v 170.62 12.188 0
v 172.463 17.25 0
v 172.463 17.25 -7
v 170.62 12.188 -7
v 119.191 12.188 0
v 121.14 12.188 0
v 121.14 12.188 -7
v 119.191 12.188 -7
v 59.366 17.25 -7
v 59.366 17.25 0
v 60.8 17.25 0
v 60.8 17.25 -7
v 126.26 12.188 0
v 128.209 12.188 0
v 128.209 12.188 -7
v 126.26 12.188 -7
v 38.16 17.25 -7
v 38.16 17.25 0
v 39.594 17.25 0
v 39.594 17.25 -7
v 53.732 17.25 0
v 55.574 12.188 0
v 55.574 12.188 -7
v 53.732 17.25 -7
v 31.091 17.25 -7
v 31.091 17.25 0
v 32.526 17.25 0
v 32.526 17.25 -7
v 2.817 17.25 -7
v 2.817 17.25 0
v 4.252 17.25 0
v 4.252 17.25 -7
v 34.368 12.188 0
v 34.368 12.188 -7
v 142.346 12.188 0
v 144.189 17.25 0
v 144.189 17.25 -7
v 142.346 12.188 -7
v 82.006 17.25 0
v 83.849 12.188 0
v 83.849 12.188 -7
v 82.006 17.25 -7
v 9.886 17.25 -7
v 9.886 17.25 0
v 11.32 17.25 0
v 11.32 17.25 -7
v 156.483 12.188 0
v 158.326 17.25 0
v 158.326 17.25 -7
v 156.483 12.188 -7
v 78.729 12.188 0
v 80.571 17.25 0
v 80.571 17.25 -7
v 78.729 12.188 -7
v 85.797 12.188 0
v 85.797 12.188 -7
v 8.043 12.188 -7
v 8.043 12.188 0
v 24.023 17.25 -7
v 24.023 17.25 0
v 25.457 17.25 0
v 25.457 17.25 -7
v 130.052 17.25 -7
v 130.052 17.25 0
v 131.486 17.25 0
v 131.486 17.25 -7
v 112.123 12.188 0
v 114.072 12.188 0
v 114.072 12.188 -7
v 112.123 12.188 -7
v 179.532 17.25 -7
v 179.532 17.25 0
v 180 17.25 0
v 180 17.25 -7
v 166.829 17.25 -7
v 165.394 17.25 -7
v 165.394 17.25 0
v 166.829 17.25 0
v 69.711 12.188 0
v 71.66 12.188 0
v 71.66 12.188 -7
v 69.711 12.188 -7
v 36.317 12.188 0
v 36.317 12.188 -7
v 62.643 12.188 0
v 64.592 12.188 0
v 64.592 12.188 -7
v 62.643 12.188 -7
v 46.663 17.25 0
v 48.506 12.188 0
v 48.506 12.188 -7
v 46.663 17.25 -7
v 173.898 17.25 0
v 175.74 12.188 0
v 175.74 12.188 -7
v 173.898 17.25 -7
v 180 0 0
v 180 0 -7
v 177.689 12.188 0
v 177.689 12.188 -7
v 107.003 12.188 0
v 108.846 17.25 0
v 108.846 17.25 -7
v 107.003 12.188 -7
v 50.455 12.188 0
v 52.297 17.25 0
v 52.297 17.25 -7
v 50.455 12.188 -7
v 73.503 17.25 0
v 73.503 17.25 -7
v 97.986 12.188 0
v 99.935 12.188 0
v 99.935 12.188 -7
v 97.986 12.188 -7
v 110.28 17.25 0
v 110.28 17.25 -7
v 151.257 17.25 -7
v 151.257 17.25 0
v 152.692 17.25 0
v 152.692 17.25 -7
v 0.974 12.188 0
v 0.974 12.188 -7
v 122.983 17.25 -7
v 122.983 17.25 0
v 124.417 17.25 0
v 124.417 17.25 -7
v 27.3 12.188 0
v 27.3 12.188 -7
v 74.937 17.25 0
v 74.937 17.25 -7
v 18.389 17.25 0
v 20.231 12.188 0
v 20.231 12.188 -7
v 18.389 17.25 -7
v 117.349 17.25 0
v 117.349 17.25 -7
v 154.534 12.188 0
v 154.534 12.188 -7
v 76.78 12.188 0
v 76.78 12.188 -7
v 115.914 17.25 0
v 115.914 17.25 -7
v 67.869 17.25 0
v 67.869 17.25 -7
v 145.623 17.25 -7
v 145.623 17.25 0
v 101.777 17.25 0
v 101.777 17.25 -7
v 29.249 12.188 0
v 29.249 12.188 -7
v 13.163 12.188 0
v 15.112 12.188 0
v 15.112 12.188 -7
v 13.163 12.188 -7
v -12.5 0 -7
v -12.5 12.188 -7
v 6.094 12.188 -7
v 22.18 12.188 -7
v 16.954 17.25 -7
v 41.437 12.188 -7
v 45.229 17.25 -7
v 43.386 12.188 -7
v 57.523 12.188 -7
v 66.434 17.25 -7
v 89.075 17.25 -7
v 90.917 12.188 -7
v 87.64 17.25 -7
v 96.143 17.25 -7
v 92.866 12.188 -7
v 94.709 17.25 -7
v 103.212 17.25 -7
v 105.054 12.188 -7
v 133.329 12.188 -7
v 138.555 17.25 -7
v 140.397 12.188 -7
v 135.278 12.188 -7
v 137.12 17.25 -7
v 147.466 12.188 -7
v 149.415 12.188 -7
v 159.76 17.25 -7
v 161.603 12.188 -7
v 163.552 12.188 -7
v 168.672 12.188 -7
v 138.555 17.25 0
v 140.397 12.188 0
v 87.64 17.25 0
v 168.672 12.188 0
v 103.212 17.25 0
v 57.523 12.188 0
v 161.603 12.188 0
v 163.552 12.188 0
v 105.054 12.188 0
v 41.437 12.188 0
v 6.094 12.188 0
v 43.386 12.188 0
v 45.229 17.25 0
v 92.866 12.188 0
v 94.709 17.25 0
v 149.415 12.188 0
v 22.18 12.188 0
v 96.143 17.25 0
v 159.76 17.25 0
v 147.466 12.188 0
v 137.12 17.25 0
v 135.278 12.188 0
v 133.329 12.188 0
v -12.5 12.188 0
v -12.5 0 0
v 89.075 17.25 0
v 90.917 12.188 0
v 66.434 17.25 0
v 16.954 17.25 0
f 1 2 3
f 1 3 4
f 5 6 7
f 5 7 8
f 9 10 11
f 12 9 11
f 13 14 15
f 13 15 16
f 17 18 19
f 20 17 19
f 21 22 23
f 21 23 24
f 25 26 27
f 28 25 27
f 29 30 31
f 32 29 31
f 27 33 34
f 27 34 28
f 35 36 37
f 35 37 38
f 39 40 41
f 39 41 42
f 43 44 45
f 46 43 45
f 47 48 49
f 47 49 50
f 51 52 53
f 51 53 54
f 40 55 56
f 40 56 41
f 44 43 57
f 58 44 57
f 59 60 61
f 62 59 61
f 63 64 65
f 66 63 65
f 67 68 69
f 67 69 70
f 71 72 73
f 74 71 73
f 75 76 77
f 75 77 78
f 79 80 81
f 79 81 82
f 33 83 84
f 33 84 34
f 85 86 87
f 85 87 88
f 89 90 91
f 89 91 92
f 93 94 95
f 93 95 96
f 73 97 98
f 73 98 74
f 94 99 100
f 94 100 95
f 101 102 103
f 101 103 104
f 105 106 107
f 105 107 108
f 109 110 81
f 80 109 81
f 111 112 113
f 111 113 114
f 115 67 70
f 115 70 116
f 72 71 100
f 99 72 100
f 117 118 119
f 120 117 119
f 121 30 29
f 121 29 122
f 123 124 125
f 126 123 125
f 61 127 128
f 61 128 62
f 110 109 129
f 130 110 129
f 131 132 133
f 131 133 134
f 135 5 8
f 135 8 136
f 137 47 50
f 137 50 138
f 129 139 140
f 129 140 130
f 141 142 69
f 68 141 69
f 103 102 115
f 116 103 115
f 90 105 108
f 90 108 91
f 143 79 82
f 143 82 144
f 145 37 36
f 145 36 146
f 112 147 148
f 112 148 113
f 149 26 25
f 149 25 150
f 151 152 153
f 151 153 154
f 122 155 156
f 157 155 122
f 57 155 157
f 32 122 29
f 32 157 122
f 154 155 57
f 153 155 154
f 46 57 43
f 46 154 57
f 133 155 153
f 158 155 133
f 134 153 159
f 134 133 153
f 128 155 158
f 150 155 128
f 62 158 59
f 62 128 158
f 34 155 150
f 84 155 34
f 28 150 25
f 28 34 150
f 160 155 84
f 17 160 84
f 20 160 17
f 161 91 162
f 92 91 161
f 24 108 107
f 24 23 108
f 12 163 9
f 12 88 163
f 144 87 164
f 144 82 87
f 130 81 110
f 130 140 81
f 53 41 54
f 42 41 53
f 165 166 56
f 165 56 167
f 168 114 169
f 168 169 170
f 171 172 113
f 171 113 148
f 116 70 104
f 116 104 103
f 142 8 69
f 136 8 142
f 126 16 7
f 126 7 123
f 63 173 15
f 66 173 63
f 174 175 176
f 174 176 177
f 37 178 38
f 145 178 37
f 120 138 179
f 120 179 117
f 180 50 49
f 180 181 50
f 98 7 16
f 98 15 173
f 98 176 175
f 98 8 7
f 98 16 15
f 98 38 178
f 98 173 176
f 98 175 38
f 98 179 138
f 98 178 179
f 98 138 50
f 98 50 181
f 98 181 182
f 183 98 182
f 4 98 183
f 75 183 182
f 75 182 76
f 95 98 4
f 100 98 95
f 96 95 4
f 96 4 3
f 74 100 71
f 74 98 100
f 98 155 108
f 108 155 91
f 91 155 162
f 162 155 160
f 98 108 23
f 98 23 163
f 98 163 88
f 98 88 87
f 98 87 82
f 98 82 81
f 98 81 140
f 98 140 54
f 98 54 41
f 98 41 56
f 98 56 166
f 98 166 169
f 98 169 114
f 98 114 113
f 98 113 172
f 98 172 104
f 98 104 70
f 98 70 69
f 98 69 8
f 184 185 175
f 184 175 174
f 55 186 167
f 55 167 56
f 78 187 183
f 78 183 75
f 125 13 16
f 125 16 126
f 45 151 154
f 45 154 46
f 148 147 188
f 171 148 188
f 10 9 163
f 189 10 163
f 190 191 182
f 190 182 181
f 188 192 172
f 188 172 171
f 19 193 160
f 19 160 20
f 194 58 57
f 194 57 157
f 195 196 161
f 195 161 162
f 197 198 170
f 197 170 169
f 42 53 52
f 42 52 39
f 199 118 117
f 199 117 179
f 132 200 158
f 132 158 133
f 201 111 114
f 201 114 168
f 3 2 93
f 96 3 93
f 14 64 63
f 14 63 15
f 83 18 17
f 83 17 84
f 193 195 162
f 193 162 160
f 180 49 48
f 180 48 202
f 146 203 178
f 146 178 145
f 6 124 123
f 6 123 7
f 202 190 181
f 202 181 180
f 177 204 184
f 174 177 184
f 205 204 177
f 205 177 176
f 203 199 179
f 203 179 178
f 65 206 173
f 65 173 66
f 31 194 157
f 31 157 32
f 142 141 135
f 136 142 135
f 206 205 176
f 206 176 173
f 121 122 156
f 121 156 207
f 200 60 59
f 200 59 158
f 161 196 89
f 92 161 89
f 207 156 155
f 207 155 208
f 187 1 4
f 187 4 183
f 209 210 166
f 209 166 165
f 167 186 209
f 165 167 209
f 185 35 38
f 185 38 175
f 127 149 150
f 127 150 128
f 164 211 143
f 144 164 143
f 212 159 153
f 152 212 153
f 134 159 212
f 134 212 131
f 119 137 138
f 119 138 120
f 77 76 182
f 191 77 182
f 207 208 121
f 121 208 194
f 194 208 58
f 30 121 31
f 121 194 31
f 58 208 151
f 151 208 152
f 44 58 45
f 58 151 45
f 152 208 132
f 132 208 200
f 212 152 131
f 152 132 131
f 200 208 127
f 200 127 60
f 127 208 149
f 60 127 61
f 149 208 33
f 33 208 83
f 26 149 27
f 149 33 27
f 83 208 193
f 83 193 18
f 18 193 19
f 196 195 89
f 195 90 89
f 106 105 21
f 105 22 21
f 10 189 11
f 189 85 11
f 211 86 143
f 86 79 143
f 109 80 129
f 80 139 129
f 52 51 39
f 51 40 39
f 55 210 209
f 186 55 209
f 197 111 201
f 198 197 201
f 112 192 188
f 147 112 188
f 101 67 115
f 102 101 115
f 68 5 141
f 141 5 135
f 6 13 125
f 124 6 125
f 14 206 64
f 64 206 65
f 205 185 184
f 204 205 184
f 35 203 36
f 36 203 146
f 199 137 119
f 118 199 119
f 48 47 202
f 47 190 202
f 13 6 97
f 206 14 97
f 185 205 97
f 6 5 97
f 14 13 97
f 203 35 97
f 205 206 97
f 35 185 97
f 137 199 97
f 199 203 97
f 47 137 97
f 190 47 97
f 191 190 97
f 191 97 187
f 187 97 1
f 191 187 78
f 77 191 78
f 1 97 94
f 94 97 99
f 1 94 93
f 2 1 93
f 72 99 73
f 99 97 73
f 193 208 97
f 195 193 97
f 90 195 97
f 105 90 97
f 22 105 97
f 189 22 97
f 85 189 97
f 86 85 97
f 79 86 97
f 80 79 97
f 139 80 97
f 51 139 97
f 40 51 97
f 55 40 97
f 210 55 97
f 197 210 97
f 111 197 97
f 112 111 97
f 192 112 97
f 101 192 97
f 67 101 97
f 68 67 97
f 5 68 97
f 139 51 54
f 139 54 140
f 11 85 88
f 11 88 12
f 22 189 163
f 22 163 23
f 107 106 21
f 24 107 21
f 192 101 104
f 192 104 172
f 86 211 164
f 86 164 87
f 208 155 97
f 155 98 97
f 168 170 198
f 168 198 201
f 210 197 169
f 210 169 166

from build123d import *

# Parameters (mm, degrees)
BLANKSKE_W          = 180
BLANKSKE_H          = 17.25
BLANK_DEPTH         = 7
TOOTHCUTSIM_DEPTH   = 181.960113008
TEETHCUTS_COUNT     = 26
TEETHCUTS_PITCH     = 7.068583463
SKETCH1_W           = 7
SKETCH1_H           = 12.1875
BOSS_EXTRUDE1_DEPTH = 12.5


with BuildPart() as part:
    # BlankSke → Blank (new body)
    with BuildSketch(Plane.XY):
        with Locations((90, 8.625)):
            Rectangle(BLANKSKE_W, BLANKSKE_H)
    extrude(amount=-BLANK_DEPTH)

    # TooCutSkeSim → ToothCutSim (cut, through all)
    with BuildSketch(Plane.XY):
        Polygon((0.974479582, 12.1875), (-0.974479582, 12.1875), (-2.826323737, 17.2754), (2.826323737, 17.2754), align=None)
    toothcutsim = extrude(amount=-TOOTHCUTSIM_DEPTH, mode=Mode.SUBTRACT)

    # TeethCuts: ToothCutSim ×26
    with Locations(*[(i * TEETHCUTS_PITCH, 0, 0) for i in range(1, TEETHCUTS_COUNT)]):
        add(toothcutsim, mode=Mode.SUBTRACT)

    # Sketch1 → Boss-Extrude1 (add)
    with BuildSketch(Plane.ZY):
        with Locations((-3.5, 6.09375)):
            Rectangle(SKETCH1_W, SKETCH1_H)
    extrude(amount=BOSS_EXTRUDE1_DEPTH)


solid = part.part
